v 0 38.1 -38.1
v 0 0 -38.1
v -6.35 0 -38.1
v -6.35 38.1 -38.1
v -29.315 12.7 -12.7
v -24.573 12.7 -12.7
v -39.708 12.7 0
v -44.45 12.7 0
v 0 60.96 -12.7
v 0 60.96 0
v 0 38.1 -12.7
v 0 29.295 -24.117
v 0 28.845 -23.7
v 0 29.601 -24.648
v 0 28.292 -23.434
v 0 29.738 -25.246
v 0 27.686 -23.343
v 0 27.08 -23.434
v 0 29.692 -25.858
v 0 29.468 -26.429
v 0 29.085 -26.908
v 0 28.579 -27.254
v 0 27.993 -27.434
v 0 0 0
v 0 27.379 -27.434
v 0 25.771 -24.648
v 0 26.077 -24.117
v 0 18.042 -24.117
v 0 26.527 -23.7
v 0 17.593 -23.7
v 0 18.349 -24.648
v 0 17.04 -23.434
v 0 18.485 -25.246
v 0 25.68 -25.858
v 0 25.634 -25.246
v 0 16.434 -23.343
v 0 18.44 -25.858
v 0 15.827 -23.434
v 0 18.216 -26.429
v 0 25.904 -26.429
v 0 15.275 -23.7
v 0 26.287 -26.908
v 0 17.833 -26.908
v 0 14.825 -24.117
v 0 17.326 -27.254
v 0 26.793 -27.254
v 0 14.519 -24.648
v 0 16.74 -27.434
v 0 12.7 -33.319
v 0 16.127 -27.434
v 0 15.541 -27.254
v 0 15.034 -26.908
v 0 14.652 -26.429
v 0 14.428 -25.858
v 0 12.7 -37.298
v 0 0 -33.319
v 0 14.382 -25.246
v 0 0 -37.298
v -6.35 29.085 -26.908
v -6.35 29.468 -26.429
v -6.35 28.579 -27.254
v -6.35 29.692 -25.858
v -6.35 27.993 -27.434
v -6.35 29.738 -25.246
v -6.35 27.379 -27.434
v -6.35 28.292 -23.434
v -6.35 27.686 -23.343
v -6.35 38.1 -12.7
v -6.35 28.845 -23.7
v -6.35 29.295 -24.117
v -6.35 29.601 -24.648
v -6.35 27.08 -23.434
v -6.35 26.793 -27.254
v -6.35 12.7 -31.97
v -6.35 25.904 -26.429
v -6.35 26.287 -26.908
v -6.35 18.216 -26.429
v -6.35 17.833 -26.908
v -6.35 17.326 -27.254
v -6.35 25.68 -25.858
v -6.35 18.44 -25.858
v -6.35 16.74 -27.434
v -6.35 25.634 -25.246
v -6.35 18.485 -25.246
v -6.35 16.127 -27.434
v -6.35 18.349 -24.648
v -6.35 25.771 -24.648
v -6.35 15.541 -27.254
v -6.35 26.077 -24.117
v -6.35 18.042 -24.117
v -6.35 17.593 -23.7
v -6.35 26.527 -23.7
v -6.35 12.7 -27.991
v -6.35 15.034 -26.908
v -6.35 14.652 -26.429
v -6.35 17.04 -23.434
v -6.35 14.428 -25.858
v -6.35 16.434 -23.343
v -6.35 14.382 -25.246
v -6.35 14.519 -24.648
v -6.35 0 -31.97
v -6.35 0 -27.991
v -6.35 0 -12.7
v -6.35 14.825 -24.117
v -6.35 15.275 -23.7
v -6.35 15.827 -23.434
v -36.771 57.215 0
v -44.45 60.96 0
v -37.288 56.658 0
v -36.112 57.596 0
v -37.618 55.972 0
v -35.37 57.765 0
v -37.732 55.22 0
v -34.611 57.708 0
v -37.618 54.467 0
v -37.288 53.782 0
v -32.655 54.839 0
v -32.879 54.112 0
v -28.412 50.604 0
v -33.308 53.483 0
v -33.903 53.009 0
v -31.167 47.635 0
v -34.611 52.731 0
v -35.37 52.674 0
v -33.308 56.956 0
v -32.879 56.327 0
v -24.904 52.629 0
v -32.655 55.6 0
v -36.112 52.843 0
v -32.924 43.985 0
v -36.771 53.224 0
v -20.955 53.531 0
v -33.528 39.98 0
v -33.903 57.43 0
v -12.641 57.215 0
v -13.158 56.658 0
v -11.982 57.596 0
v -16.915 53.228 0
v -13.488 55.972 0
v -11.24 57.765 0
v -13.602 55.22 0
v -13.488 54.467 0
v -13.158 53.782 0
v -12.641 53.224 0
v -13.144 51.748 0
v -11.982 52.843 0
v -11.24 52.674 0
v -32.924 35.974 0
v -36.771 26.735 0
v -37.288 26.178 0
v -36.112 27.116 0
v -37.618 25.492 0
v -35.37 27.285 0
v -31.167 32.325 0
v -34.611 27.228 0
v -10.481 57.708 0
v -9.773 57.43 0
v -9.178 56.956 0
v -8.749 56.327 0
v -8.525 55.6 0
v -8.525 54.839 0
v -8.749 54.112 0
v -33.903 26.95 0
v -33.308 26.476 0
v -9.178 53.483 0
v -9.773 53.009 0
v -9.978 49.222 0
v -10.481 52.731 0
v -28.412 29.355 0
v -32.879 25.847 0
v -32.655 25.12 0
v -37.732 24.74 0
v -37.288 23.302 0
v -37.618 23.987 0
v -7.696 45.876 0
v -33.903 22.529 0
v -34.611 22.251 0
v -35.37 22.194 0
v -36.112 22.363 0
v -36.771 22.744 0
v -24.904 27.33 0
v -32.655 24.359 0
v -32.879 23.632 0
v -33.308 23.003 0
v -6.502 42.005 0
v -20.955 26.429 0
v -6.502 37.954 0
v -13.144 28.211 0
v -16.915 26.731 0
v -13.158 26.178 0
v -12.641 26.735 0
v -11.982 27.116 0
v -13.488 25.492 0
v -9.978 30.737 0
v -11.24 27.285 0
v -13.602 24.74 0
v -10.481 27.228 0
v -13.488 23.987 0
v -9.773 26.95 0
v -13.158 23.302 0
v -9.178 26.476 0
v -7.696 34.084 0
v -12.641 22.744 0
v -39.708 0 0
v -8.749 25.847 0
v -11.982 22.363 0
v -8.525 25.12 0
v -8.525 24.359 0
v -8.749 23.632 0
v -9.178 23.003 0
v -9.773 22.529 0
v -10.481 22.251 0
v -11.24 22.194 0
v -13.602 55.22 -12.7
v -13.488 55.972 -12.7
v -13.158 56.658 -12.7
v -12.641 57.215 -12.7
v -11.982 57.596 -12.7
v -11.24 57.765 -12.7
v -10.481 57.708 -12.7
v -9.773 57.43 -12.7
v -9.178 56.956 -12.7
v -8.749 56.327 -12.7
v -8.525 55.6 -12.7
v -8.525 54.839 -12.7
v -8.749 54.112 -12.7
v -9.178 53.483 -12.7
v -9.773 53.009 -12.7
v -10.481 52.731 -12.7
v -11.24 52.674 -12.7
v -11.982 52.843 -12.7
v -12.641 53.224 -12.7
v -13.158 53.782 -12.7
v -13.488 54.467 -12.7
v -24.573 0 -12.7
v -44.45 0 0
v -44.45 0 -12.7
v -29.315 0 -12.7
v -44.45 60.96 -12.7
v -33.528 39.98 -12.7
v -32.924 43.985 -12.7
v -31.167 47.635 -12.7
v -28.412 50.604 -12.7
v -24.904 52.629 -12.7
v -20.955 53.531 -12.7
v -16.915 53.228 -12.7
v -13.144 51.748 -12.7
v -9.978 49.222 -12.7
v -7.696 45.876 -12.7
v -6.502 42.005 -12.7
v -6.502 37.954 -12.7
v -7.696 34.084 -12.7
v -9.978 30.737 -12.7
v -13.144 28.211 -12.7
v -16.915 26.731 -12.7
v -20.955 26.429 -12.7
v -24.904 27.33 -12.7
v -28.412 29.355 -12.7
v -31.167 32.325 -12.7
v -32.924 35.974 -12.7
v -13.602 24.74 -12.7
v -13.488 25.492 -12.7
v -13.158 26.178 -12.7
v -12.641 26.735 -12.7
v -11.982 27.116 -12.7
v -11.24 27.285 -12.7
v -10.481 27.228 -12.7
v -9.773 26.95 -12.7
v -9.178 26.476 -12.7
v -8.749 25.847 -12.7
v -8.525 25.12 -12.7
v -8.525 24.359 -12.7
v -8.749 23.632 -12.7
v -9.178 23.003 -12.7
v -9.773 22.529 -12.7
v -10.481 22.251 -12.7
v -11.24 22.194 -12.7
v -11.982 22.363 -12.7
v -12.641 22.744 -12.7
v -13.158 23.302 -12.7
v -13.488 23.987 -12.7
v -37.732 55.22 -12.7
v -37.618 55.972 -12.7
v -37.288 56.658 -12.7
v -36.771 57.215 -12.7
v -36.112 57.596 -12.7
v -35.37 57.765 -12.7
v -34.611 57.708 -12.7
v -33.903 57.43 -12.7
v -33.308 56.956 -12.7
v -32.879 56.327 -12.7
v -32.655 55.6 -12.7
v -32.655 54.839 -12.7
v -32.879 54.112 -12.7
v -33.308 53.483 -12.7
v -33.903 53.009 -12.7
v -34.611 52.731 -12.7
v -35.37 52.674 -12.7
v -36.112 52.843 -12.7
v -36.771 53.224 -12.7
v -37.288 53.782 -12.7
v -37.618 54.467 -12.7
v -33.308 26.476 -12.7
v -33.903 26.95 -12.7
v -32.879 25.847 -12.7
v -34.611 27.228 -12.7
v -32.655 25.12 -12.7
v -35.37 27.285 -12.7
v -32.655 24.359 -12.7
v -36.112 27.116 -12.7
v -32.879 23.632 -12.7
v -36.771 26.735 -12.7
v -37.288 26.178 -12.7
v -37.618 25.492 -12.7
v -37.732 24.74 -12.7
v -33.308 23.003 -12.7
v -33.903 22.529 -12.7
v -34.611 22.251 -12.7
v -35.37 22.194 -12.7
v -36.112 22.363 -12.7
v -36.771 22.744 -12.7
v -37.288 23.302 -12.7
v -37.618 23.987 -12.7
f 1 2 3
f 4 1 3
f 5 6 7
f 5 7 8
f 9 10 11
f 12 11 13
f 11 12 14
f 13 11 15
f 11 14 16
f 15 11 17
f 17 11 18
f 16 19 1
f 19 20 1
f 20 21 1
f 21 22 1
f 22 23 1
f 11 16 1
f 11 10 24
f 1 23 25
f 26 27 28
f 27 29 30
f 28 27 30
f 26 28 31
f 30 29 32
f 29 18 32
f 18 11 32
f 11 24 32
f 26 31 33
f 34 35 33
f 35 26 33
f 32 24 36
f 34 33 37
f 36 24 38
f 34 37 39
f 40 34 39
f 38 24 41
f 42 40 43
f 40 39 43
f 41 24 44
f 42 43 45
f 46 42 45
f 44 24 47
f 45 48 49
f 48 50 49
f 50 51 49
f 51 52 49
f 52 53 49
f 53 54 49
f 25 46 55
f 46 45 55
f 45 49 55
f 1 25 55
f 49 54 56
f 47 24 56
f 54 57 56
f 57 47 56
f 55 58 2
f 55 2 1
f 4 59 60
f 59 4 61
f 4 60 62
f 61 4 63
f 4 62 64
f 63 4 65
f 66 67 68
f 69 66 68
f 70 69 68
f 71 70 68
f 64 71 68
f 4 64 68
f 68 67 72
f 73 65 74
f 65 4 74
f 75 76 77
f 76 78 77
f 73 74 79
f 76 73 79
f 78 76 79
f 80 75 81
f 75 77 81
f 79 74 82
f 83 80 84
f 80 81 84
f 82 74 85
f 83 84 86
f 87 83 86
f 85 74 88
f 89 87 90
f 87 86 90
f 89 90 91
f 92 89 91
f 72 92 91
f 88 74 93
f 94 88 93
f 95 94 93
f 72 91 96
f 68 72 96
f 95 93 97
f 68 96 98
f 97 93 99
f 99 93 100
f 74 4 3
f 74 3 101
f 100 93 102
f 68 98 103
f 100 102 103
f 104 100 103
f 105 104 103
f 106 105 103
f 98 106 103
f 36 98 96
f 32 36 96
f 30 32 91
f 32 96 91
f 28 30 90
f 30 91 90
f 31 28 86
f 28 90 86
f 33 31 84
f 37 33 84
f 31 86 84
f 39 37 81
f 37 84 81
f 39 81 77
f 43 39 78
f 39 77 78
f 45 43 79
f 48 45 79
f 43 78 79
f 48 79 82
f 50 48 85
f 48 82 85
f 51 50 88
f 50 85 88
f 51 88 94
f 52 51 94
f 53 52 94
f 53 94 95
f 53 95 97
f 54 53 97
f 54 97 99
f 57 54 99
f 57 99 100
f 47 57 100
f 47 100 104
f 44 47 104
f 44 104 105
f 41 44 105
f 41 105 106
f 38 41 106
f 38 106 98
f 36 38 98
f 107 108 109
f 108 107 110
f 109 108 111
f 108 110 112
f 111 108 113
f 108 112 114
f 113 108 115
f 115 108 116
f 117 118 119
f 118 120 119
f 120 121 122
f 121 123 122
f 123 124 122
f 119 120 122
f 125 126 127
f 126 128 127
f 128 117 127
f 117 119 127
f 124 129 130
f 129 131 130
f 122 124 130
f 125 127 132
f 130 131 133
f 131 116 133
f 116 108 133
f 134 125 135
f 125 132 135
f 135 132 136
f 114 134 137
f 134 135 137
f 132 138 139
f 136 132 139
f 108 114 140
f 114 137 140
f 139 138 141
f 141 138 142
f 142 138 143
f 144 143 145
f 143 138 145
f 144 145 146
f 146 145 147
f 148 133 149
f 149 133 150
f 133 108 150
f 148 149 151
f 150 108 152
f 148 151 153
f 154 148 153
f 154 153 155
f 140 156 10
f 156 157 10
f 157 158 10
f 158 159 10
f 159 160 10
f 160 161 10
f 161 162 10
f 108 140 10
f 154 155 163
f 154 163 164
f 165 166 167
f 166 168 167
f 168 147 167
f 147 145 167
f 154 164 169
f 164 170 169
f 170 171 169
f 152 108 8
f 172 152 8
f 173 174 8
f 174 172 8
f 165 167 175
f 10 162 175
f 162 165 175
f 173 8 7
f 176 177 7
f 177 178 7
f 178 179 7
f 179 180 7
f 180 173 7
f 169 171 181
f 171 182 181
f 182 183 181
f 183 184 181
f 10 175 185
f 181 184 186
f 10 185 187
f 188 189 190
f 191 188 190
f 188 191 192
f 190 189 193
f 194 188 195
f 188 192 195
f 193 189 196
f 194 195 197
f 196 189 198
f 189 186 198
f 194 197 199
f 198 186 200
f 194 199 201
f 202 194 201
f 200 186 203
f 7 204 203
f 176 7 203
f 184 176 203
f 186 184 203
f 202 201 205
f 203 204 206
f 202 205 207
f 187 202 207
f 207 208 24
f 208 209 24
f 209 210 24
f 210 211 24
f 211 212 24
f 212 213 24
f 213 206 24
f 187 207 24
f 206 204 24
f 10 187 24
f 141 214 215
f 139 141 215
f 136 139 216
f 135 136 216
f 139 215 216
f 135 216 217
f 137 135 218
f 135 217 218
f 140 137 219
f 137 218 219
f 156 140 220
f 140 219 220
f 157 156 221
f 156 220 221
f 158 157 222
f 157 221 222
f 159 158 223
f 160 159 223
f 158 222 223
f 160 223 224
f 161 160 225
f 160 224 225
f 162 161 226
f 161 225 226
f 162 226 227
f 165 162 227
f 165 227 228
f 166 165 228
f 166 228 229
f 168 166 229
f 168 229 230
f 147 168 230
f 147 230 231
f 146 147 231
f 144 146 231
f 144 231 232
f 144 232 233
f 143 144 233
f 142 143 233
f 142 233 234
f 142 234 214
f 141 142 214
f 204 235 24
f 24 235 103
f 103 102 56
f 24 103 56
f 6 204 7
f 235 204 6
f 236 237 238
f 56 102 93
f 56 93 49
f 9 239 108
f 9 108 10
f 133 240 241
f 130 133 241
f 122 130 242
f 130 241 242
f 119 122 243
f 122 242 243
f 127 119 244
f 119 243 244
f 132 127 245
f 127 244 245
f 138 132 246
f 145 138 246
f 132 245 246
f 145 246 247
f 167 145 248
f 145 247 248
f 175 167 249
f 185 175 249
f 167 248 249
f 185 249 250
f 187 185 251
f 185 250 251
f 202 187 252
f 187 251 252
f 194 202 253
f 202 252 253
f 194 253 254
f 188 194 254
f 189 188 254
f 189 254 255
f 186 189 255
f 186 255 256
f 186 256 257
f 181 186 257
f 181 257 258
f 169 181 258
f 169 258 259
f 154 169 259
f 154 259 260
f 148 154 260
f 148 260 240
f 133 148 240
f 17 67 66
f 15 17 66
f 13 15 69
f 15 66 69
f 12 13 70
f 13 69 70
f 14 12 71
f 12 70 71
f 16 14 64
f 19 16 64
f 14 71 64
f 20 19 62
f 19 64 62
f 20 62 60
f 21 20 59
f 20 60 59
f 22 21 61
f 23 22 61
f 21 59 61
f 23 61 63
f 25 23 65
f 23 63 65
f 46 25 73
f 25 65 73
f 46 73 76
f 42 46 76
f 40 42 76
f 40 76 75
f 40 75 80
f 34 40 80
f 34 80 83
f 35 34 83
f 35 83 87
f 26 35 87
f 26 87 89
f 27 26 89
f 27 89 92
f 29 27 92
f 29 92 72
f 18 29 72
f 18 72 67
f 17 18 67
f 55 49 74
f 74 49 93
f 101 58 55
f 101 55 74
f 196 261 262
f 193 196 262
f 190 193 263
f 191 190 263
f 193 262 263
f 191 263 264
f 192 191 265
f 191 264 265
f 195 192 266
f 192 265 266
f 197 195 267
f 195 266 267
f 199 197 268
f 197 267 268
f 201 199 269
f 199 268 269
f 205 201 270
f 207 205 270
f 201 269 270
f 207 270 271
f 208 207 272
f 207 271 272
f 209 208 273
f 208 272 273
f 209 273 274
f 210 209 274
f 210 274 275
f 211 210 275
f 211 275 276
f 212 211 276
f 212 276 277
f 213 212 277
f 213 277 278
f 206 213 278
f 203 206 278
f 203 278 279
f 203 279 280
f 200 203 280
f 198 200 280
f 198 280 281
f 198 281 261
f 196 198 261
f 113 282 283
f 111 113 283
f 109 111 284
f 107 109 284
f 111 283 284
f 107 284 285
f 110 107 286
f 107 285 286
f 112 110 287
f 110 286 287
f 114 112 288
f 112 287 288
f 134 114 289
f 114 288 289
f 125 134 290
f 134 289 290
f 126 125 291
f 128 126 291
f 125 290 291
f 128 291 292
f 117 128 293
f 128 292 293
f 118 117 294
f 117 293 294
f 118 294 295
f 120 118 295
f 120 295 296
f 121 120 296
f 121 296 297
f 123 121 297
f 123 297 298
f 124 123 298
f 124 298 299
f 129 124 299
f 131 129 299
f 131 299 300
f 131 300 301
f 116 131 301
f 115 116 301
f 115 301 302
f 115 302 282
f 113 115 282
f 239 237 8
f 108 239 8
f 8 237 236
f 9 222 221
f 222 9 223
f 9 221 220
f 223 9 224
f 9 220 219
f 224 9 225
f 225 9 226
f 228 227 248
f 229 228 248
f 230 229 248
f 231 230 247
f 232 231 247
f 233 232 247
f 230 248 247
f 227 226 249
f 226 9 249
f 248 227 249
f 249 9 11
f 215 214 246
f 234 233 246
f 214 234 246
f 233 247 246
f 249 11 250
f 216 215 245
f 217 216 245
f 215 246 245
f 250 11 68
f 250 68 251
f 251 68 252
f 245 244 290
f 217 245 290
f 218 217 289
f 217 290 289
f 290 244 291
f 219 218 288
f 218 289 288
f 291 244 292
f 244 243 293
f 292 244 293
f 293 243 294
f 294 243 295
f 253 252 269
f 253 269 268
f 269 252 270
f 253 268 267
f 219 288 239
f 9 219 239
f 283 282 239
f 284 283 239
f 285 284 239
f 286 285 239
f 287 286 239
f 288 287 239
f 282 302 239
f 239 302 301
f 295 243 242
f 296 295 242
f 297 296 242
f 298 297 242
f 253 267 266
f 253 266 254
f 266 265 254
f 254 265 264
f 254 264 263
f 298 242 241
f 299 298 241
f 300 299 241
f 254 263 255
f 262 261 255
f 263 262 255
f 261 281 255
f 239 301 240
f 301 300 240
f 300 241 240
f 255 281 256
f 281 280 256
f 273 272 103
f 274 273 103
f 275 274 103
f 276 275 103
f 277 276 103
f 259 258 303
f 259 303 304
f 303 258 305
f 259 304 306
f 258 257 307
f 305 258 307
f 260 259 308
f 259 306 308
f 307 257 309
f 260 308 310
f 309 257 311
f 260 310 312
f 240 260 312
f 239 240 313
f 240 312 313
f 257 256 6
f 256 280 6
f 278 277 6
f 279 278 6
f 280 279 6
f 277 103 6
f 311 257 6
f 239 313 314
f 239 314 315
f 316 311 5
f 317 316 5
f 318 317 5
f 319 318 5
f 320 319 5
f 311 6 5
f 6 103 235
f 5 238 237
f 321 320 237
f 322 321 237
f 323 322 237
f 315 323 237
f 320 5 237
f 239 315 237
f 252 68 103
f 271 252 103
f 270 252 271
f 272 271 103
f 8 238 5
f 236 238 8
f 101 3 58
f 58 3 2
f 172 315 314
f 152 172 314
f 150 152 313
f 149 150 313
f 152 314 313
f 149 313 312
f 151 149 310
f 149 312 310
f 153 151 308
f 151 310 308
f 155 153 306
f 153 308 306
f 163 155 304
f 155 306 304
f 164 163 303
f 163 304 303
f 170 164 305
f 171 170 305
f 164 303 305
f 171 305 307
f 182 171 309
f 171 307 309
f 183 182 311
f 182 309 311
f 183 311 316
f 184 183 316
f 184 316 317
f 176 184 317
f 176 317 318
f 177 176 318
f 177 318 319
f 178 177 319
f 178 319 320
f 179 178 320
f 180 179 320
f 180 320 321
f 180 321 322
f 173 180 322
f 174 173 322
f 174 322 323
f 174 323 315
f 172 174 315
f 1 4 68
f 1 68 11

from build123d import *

# Parameters (mm, degrees)
BOSS_EXTRUDE1_DEPTH         = 60.96
SKETCH4_R                   = 2.0574
CUT_EXTRUDE3_DEPTH          = 7.35
SKETCH3_R                   = 13.589
SKETCH3_R_2                 = 2.54
CUT_EXTRUDE2_DEPTH          = 13.7
CUT_EXTRUDE4_DEPTH          = 12.7
SKETCH10_W                  = 6.35
SKETCH10_H                  = 25.4
CUT_EXTRUDE5_DEPTH          = 22.86
F_1_4_20_TAPPED_HOLE1_D     = 5.1054
F_1_4_20_TAPPED_HOLE1_DEPTH = 16.51
F_1_4_20_TAPPED_HOLE1_TIP   = 1.533816902


with BuildPart() as part:
    # Sketch1 → Boss-Extrude1 (new body)
    with BuildSketch(Plane(origin=(0, 0, 0), x_dir=(1, 0, 0), z_dir=(0, 1, 0))):
        Polygon((-44.45, 12.7), (-44.45, 0), (0, 0), (0, 38.1), (-6.35, 38.1), (-6.35, 12.7), align=None)
    extrude(amount=BOSS_EXTRUDE1_DEPTH)

    # Sketch4 → Cut-Extrude3 (cut, through all)
    with BuildSketch(Plane.ZY.offset(6.35)):
        with Locations((-25.4, 16.4338)):
            Circle(SKETCH4_R)
        with Locations((-25.4, 27.686)):
            Circle(SKETCH4_R)
    extrude(amount=-CUT_EXTRUDE3_DEPTH, mode=Mode.SUBTRACT)

    # Sketch3 → Cut-Extrude2 (cut, through all)
    with BuildSketch(Plane(origin=(0, 0, -12.7), x_dir=(-1, 0, 0), z_dir=(0, 0, -1))):
        with Locations((19.939, 39.9796)):
            Circle(SKETCH3_R)
        with Locations((35.179, 55.2196)):
            Circle(SKETCH3_R_2)
        with Locations((11.049, 55.2196)):
            Circle(SKETCH3_R_2)
        with Locations((11.049, 24.7396)):
            Circle(SKETCH3_R_2)
        with Locations((35.179, 24.7396)):
            Circle(SKETCH3_R_2)
    extrude(amount=-CUT_EXTRUDE2_DEPTH, mode=Mode.SUBTRACT)

    # Sketch6 → Cut-Extrude4 (cut)
    with BuildSketch(Plane.XZ):
        Polygon((-47.891108231, 6.866314065), (10.481478335, -42.114101793), (8.522261701, -44.449005256), (-49.850324865, 4.531410602), align=None)
    extrude(amount=-CUT_EXTRUDE4_DEPTH, mode=Mode.SUBTRACT)

    # Sketch10 → Cut-Extrude5 (cut)
    with BuildSketch(Plane(origin=(0, 60.96, 0), x_dir=(1, 0, 0), z_dir=(0, 1, 0))):
        with Locations((-3.175, 25.4)):
            Rectangle(SKETCH10_W, SKETCH10_H)
    extrude(amount=-CUT_EXTRUDE5_DEPTH, mode=Mode.SUBTRACT)

    # 1/4-20 Tapped Hole1
    with Locations(Plane.XY):
        with Locations((-35.179, 55.2196), (-11.049, 55.2196), (-35.179, 24.7396), (-11.049, 24.7396)):
            Hole(F_1_4_20_TAPPED_HOLE1_D / 2, depth=F_1_4_20_TAPPED_HOLE1_DEPTH)
            with Locations((0, 0, -(F_1_4_20_TAPPED_HOLE1_DEPTH + F_1_4_20_TAPPED_HOLE1_TIP / 2))):  # 118° drill point
                Cone(0, F_1_4_20_TAPPED_HOLE1_D / 2, F_1_4_20_TAPPED_HOLE1_TIP, mode=Mode.SUBTRACT)


solid = part.part
